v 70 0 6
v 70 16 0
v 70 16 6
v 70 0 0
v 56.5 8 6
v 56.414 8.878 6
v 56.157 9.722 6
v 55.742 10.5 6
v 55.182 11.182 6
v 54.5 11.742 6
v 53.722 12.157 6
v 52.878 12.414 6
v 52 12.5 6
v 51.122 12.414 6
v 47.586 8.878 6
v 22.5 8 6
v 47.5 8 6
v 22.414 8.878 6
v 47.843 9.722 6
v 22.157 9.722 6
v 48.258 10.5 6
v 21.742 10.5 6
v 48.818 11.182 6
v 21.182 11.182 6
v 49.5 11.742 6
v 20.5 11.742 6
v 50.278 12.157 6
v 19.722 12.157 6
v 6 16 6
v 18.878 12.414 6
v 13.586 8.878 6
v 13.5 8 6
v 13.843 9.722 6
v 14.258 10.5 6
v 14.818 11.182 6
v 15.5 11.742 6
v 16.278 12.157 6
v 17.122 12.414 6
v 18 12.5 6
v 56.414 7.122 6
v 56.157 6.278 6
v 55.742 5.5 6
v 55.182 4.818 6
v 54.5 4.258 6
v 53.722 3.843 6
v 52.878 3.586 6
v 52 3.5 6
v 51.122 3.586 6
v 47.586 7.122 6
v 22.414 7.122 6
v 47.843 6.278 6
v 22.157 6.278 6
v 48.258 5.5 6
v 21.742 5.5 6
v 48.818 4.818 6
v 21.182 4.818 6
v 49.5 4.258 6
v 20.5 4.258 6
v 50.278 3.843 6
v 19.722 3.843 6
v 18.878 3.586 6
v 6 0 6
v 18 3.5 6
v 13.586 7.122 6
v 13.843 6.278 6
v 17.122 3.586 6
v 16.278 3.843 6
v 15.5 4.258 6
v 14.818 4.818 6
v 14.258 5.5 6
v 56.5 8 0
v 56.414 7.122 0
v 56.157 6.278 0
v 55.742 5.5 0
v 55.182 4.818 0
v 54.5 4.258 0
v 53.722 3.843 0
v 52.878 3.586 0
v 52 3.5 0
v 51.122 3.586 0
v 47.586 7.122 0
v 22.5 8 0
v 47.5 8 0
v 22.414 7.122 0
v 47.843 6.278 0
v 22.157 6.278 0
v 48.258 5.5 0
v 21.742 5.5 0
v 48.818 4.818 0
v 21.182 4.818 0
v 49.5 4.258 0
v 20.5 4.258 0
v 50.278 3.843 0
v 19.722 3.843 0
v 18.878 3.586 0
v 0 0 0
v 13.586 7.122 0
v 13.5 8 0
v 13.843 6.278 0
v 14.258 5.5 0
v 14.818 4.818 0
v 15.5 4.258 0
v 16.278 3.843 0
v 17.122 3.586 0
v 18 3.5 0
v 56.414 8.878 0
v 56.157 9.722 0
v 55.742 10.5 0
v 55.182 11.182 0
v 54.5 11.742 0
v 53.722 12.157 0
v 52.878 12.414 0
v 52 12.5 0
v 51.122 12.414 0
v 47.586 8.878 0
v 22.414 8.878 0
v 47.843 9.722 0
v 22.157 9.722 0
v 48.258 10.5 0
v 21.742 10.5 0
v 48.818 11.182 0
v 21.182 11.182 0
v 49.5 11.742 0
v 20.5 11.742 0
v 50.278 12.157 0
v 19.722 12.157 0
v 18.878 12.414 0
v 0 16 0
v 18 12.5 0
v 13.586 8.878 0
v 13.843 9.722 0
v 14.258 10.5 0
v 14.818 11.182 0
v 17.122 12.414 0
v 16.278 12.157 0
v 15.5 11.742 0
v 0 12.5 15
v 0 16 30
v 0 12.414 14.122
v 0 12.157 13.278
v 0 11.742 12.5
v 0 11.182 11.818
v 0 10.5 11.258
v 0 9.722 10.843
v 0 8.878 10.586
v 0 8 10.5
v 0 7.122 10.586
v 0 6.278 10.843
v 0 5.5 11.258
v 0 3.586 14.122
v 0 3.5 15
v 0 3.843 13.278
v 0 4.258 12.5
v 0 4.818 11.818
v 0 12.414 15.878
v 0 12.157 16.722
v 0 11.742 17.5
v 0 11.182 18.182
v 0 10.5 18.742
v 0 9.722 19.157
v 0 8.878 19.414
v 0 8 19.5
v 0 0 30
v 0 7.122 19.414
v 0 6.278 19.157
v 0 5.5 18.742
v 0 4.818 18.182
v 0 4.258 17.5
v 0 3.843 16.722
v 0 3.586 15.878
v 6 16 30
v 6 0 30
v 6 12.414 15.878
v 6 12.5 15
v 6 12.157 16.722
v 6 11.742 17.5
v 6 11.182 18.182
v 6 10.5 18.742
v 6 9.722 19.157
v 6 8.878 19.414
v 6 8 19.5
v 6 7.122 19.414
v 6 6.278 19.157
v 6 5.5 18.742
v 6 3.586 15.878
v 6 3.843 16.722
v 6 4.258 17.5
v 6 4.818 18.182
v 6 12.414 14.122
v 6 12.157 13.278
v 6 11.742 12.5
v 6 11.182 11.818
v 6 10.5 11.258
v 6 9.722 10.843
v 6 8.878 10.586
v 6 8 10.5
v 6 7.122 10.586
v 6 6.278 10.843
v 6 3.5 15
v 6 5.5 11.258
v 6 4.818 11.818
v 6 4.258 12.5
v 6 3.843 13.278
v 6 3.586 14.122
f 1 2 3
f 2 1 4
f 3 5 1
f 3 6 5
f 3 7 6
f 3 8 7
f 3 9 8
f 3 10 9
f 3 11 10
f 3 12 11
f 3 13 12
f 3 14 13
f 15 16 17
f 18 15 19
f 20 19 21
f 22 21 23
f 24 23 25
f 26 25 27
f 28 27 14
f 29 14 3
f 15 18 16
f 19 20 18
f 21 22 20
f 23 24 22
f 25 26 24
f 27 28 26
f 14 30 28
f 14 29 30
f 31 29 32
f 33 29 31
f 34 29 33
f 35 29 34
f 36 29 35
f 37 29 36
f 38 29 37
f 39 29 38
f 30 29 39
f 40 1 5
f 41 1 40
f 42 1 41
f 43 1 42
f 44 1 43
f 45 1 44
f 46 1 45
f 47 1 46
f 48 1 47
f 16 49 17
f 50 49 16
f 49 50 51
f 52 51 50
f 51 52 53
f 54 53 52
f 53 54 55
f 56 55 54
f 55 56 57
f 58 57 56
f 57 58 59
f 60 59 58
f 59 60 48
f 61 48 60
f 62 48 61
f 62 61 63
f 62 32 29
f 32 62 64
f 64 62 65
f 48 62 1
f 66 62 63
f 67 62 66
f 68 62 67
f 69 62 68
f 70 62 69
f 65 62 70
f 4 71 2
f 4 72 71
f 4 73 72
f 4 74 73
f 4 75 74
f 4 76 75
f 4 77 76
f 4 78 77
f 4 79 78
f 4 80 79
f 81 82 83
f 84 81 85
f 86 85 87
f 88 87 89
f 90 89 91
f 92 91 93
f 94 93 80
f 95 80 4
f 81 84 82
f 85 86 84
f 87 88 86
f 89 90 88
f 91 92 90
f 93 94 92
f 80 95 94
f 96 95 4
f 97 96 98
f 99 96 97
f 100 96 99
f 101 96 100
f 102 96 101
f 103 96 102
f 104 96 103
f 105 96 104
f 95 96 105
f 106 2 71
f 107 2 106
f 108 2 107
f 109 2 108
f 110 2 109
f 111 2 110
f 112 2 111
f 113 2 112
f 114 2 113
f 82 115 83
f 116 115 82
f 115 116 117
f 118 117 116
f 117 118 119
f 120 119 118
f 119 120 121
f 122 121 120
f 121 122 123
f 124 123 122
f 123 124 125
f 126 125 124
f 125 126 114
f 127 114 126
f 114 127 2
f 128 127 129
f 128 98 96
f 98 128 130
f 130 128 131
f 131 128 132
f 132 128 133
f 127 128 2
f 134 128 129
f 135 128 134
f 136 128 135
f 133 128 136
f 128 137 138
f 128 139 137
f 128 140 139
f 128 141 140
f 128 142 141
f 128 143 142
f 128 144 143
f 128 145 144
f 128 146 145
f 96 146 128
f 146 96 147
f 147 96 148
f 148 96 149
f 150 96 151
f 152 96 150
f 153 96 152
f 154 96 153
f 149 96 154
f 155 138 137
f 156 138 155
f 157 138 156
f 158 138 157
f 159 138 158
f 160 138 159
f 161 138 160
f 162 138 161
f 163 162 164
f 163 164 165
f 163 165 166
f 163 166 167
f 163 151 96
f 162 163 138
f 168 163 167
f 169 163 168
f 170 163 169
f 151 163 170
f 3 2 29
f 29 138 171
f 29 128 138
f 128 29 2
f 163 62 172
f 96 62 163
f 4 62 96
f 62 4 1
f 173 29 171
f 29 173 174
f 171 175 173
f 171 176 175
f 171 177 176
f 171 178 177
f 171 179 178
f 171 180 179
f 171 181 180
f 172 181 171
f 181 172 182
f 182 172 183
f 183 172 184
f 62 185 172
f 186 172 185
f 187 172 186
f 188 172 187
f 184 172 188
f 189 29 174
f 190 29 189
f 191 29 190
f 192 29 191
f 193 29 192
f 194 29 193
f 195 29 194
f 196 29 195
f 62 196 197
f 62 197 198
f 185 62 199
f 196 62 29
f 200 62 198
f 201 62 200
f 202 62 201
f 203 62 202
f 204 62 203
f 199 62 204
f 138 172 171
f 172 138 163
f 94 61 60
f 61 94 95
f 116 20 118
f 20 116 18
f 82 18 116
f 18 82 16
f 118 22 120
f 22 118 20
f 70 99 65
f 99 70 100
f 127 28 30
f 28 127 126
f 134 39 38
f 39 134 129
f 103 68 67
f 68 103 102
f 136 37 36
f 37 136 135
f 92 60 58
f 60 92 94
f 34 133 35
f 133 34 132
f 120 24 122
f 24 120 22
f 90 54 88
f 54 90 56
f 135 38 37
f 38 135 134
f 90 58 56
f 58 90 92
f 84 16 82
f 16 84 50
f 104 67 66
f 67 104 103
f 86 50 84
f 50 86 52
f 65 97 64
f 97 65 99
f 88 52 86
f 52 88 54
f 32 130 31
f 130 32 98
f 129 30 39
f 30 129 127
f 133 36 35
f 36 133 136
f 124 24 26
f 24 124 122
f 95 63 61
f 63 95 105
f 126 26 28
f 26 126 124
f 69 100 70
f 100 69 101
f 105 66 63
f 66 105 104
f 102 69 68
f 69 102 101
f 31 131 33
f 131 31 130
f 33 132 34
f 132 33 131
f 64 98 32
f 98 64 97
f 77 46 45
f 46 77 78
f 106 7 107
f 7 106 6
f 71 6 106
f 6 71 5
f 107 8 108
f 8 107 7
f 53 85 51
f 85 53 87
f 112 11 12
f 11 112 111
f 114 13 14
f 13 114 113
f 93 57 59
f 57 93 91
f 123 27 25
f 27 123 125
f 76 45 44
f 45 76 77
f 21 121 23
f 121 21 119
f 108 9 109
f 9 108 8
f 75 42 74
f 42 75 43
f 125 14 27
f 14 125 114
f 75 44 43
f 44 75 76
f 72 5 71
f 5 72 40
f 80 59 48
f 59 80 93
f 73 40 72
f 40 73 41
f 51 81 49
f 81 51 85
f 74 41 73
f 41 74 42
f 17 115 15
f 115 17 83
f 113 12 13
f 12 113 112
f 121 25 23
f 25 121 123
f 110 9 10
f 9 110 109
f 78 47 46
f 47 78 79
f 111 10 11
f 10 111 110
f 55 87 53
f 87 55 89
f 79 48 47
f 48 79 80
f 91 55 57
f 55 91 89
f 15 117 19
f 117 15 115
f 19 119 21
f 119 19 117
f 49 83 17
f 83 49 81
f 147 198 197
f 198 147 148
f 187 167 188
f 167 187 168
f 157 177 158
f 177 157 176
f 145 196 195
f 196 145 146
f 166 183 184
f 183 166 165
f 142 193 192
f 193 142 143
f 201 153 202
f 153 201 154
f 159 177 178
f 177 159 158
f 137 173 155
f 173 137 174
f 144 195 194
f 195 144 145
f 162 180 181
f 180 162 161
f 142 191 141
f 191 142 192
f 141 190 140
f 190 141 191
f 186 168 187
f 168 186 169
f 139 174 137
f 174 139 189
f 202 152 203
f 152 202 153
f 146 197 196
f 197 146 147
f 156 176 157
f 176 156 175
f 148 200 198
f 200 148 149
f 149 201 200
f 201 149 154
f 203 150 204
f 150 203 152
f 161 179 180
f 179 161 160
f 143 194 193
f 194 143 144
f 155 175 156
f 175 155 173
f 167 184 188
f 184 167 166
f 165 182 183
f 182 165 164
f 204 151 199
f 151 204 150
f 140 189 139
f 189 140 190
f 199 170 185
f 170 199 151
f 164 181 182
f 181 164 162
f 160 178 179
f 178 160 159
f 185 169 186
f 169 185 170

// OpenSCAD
$fn = 32;

// ----------------------------------------------------------------------
// L-bracket: 70 x 16 x 30 mm
// ----------------------------------------------------------------------

// --- parameters (mm) ---
arm_x = 70;               // horizontal leg, X
arm_z = 30;               // vertical leg, Z
width = 16;               // bracket depth, Y
wall = 6;                 // plate thickness
hole_d = 9;               // clearance for M8

module hole_z(px, py) {
  translate([px, py, -0.5]) cylinder(h = wall + 1, d = hole_d);
}
module hole_x(pz, py) {
  translate([-0.5, py, pz]) rotate([0, 90, 0]) cylinder(h = wall + 1, d = hole_d);
}

difference() {
  union() {
    /* horizontal leg */
    cube([arm_x, width, wall]);
    /* vertical leg, overlapping the corner block */
    cube([wall, width, arm_z]);
  }
  hole_z(18, 8);
  hole_z(52, 8);
  hole_x(15, 8);
}
